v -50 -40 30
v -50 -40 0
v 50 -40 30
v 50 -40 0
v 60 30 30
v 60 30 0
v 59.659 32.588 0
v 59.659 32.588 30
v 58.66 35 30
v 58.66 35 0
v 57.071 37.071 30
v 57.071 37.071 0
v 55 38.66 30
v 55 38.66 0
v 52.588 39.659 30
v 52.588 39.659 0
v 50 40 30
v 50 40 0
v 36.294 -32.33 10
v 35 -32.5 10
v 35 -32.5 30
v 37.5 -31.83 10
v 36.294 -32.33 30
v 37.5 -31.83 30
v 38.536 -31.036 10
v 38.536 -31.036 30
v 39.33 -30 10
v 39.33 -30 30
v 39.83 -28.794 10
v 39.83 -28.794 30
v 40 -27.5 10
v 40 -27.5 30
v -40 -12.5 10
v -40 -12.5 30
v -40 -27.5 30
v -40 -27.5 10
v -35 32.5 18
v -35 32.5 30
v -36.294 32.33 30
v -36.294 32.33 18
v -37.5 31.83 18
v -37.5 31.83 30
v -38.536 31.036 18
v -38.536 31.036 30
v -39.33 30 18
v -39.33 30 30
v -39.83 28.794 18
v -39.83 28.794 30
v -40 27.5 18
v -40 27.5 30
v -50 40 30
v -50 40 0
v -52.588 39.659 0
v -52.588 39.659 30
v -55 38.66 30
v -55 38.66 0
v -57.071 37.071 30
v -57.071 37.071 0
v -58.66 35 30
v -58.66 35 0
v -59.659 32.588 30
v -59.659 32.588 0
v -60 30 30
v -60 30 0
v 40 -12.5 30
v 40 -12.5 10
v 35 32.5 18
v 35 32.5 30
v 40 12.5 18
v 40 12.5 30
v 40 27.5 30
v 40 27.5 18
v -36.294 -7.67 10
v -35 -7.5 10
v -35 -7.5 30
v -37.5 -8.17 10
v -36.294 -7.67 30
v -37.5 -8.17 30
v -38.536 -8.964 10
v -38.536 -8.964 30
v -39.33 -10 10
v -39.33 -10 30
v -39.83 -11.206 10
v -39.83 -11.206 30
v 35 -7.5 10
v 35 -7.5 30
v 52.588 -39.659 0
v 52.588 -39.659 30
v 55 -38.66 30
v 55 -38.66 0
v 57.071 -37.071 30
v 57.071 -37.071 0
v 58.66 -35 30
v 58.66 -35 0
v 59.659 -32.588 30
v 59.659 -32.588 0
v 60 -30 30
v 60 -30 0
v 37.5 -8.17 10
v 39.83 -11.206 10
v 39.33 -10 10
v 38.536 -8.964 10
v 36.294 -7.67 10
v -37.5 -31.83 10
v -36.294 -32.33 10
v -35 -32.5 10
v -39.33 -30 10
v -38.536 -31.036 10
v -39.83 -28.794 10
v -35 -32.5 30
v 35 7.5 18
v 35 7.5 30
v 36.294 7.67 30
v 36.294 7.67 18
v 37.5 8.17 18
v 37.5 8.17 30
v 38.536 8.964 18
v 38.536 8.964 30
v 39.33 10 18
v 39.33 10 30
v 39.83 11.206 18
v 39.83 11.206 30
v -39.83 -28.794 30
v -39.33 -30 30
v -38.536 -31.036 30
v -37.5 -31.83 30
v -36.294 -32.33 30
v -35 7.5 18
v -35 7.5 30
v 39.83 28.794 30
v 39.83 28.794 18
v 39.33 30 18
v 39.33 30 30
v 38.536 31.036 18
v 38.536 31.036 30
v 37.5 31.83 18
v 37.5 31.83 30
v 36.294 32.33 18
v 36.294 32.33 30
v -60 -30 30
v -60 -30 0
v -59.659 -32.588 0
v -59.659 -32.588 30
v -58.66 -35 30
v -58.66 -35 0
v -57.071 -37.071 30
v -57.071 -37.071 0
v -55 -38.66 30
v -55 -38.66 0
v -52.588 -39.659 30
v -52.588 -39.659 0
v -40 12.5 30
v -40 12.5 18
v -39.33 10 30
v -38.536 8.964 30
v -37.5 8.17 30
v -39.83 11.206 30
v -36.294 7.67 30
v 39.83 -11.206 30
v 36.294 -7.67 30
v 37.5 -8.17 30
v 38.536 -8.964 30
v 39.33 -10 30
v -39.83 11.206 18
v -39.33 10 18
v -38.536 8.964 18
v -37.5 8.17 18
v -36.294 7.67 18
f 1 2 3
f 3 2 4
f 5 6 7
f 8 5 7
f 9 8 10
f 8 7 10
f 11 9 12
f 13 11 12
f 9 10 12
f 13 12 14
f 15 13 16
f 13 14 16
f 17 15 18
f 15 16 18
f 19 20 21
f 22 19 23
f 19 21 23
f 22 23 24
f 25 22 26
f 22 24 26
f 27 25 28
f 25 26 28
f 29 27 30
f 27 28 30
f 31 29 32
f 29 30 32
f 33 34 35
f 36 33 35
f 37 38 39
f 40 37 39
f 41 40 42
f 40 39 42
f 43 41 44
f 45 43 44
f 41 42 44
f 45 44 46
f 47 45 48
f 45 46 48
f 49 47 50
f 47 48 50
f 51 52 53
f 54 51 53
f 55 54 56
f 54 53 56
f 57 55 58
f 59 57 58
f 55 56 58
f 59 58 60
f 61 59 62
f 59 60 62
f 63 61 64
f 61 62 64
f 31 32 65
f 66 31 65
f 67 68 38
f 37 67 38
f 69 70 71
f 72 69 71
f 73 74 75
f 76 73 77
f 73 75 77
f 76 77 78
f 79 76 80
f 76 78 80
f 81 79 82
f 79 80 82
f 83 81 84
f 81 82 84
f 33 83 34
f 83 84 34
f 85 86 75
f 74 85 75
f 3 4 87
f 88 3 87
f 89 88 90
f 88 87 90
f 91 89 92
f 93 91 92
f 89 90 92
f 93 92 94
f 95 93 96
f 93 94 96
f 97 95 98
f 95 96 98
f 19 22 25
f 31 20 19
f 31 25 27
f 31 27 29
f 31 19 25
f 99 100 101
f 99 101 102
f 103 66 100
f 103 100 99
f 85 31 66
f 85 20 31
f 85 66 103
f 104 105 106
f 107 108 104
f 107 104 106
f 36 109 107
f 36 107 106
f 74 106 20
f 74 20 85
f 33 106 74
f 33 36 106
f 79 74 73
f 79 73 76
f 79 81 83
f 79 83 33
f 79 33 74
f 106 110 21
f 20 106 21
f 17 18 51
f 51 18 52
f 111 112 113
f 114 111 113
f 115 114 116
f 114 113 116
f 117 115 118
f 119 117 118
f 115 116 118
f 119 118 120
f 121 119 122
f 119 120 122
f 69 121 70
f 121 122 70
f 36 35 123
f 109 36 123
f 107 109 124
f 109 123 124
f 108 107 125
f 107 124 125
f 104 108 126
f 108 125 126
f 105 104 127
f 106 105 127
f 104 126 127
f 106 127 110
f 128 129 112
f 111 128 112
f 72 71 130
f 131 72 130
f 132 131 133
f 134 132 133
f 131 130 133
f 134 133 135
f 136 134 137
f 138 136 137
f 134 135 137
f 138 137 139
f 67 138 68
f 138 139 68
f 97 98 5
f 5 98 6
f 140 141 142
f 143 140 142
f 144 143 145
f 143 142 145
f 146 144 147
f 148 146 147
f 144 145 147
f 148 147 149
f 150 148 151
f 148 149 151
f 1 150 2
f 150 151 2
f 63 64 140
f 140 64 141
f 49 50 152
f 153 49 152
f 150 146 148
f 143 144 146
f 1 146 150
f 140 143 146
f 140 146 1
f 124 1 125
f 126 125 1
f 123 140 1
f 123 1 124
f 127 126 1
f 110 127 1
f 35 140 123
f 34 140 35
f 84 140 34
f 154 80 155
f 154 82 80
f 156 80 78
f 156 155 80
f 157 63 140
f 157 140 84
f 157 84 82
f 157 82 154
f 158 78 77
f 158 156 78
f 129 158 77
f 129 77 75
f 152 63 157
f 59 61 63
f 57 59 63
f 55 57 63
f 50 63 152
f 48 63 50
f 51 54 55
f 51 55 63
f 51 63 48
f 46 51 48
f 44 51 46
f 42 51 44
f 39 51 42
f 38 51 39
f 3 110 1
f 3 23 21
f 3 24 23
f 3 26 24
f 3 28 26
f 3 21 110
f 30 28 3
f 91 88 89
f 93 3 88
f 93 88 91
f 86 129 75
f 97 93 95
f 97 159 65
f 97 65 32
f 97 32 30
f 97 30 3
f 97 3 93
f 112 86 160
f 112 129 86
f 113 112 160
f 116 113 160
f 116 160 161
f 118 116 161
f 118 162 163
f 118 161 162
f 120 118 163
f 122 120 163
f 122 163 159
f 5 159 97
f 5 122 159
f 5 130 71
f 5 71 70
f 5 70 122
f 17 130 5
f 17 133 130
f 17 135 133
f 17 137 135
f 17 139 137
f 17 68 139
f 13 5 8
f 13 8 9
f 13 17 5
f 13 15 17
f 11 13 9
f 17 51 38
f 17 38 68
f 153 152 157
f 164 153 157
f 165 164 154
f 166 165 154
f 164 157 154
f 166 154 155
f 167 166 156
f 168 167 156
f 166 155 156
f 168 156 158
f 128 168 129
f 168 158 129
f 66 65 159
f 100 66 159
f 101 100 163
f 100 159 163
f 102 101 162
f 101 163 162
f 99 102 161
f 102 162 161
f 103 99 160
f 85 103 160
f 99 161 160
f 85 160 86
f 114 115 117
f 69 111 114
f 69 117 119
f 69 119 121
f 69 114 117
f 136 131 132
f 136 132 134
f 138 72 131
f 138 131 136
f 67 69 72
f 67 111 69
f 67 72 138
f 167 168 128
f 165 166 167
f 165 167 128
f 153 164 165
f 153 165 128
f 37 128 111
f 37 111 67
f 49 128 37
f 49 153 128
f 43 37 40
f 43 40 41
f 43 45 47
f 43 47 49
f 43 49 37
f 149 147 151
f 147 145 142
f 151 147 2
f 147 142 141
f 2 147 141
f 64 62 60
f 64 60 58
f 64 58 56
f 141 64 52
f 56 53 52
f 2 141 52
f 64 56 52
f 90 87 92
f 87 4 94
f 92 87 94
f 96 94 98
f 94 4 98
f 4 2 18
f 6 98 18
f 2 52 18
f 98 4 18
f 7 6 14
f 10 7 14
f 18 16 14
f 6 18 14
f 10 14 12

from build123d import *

# Parameters (mm, degrees)
PAD_DEPTH       = 30
POCKET_DEPTH    = 12
POCKET001_DEPTH = 20


with BuildPart() as part:
    # Sketch001 → Pad (new body)
    with BuildSketch(Plane.XY):
        with BuildLine():
            Line((-60, 30), (-60, -30))
            ThreePointArc((-60, -30), (-57.071068, -37.071068), (-50, -40))
            Line((-50, -40), (50, -40))
            ThreePointArc((50, -40), (57.071068, -37.071068), (60, -30))
            Line((60, -30), (60, 30))
            ThreePointArc((60, 30), (57.071068, 37.071068), (50, 40))
            Line((50, 40), (-50, 40))
            ThreePointArc((-50, 40), (-57.071068, 37.071068), (-60, 30))
        make_face()
    extrude(amount=PAD_DEPTH)

    # Binder → Pocket (cut)
    with BuildSketch(Plane(origin=(0, 20, 30), x_dir=(0, 1, 0), z_dir=(0, 0, 1))):
        with BuildLine():
            Line((7.5, 40), (-7.5, 40))
            ThreePointArc((-7.5, 40), (-11.035534, 38.535534), (-12.5, 35))
            Line((-12.5, 35), (-12.5, -35))
            ThreePointArc((-12.5, -35), (-11.035534, -38.535534), (-7.5, -40))
            Line((-7.5, -40), (7.5, -40))
            ThreePointArc((7.5, -40), (11.035534, -38.535534), (12.5, -35))
            Line((12.5, -35), (12.5, 35))
            ThreePointArc((12.5, 35), (11.035534, 38.535534), (7.5, 40))
        make_face()
    extrude(amount=-POCKET_DEPTH, mode=Mode.SUBTRACT)

    # Binder001 → Pocket001 (cut)
    with BuildSketch(Plane(origin=(0, -20, 30), x_dir=(0, 1, 0), z_dir=(0, 0, 1))):
        with BuildLine():
            Line((7.5, 40), (-7.5, 40))
            ThreePointArc((-7.5, 40), (-11.035534, 38.535534), (-12.5, 35))
            Line((-12.5, 35), (-12.5, -35))
            ThreePointArc((-12.5, -35), (-11.035534, -38.535534), (-7.5, -40))
            Line((-7.5, -40), (7.5, -40))
            ThreePointArc((7.5, -40), (11.035534, -38.535534), (12.5, -35))
            Line((12.5, -35), (12.5, 35))
            ThreePointArc((12.5, 35), (11.035534, 38.535534), (7.5, 40))
        make_face()
    extrude(amount=-POCKET001_DEPTH, mode=Mode.SUBTRACT)


solid = part.part
